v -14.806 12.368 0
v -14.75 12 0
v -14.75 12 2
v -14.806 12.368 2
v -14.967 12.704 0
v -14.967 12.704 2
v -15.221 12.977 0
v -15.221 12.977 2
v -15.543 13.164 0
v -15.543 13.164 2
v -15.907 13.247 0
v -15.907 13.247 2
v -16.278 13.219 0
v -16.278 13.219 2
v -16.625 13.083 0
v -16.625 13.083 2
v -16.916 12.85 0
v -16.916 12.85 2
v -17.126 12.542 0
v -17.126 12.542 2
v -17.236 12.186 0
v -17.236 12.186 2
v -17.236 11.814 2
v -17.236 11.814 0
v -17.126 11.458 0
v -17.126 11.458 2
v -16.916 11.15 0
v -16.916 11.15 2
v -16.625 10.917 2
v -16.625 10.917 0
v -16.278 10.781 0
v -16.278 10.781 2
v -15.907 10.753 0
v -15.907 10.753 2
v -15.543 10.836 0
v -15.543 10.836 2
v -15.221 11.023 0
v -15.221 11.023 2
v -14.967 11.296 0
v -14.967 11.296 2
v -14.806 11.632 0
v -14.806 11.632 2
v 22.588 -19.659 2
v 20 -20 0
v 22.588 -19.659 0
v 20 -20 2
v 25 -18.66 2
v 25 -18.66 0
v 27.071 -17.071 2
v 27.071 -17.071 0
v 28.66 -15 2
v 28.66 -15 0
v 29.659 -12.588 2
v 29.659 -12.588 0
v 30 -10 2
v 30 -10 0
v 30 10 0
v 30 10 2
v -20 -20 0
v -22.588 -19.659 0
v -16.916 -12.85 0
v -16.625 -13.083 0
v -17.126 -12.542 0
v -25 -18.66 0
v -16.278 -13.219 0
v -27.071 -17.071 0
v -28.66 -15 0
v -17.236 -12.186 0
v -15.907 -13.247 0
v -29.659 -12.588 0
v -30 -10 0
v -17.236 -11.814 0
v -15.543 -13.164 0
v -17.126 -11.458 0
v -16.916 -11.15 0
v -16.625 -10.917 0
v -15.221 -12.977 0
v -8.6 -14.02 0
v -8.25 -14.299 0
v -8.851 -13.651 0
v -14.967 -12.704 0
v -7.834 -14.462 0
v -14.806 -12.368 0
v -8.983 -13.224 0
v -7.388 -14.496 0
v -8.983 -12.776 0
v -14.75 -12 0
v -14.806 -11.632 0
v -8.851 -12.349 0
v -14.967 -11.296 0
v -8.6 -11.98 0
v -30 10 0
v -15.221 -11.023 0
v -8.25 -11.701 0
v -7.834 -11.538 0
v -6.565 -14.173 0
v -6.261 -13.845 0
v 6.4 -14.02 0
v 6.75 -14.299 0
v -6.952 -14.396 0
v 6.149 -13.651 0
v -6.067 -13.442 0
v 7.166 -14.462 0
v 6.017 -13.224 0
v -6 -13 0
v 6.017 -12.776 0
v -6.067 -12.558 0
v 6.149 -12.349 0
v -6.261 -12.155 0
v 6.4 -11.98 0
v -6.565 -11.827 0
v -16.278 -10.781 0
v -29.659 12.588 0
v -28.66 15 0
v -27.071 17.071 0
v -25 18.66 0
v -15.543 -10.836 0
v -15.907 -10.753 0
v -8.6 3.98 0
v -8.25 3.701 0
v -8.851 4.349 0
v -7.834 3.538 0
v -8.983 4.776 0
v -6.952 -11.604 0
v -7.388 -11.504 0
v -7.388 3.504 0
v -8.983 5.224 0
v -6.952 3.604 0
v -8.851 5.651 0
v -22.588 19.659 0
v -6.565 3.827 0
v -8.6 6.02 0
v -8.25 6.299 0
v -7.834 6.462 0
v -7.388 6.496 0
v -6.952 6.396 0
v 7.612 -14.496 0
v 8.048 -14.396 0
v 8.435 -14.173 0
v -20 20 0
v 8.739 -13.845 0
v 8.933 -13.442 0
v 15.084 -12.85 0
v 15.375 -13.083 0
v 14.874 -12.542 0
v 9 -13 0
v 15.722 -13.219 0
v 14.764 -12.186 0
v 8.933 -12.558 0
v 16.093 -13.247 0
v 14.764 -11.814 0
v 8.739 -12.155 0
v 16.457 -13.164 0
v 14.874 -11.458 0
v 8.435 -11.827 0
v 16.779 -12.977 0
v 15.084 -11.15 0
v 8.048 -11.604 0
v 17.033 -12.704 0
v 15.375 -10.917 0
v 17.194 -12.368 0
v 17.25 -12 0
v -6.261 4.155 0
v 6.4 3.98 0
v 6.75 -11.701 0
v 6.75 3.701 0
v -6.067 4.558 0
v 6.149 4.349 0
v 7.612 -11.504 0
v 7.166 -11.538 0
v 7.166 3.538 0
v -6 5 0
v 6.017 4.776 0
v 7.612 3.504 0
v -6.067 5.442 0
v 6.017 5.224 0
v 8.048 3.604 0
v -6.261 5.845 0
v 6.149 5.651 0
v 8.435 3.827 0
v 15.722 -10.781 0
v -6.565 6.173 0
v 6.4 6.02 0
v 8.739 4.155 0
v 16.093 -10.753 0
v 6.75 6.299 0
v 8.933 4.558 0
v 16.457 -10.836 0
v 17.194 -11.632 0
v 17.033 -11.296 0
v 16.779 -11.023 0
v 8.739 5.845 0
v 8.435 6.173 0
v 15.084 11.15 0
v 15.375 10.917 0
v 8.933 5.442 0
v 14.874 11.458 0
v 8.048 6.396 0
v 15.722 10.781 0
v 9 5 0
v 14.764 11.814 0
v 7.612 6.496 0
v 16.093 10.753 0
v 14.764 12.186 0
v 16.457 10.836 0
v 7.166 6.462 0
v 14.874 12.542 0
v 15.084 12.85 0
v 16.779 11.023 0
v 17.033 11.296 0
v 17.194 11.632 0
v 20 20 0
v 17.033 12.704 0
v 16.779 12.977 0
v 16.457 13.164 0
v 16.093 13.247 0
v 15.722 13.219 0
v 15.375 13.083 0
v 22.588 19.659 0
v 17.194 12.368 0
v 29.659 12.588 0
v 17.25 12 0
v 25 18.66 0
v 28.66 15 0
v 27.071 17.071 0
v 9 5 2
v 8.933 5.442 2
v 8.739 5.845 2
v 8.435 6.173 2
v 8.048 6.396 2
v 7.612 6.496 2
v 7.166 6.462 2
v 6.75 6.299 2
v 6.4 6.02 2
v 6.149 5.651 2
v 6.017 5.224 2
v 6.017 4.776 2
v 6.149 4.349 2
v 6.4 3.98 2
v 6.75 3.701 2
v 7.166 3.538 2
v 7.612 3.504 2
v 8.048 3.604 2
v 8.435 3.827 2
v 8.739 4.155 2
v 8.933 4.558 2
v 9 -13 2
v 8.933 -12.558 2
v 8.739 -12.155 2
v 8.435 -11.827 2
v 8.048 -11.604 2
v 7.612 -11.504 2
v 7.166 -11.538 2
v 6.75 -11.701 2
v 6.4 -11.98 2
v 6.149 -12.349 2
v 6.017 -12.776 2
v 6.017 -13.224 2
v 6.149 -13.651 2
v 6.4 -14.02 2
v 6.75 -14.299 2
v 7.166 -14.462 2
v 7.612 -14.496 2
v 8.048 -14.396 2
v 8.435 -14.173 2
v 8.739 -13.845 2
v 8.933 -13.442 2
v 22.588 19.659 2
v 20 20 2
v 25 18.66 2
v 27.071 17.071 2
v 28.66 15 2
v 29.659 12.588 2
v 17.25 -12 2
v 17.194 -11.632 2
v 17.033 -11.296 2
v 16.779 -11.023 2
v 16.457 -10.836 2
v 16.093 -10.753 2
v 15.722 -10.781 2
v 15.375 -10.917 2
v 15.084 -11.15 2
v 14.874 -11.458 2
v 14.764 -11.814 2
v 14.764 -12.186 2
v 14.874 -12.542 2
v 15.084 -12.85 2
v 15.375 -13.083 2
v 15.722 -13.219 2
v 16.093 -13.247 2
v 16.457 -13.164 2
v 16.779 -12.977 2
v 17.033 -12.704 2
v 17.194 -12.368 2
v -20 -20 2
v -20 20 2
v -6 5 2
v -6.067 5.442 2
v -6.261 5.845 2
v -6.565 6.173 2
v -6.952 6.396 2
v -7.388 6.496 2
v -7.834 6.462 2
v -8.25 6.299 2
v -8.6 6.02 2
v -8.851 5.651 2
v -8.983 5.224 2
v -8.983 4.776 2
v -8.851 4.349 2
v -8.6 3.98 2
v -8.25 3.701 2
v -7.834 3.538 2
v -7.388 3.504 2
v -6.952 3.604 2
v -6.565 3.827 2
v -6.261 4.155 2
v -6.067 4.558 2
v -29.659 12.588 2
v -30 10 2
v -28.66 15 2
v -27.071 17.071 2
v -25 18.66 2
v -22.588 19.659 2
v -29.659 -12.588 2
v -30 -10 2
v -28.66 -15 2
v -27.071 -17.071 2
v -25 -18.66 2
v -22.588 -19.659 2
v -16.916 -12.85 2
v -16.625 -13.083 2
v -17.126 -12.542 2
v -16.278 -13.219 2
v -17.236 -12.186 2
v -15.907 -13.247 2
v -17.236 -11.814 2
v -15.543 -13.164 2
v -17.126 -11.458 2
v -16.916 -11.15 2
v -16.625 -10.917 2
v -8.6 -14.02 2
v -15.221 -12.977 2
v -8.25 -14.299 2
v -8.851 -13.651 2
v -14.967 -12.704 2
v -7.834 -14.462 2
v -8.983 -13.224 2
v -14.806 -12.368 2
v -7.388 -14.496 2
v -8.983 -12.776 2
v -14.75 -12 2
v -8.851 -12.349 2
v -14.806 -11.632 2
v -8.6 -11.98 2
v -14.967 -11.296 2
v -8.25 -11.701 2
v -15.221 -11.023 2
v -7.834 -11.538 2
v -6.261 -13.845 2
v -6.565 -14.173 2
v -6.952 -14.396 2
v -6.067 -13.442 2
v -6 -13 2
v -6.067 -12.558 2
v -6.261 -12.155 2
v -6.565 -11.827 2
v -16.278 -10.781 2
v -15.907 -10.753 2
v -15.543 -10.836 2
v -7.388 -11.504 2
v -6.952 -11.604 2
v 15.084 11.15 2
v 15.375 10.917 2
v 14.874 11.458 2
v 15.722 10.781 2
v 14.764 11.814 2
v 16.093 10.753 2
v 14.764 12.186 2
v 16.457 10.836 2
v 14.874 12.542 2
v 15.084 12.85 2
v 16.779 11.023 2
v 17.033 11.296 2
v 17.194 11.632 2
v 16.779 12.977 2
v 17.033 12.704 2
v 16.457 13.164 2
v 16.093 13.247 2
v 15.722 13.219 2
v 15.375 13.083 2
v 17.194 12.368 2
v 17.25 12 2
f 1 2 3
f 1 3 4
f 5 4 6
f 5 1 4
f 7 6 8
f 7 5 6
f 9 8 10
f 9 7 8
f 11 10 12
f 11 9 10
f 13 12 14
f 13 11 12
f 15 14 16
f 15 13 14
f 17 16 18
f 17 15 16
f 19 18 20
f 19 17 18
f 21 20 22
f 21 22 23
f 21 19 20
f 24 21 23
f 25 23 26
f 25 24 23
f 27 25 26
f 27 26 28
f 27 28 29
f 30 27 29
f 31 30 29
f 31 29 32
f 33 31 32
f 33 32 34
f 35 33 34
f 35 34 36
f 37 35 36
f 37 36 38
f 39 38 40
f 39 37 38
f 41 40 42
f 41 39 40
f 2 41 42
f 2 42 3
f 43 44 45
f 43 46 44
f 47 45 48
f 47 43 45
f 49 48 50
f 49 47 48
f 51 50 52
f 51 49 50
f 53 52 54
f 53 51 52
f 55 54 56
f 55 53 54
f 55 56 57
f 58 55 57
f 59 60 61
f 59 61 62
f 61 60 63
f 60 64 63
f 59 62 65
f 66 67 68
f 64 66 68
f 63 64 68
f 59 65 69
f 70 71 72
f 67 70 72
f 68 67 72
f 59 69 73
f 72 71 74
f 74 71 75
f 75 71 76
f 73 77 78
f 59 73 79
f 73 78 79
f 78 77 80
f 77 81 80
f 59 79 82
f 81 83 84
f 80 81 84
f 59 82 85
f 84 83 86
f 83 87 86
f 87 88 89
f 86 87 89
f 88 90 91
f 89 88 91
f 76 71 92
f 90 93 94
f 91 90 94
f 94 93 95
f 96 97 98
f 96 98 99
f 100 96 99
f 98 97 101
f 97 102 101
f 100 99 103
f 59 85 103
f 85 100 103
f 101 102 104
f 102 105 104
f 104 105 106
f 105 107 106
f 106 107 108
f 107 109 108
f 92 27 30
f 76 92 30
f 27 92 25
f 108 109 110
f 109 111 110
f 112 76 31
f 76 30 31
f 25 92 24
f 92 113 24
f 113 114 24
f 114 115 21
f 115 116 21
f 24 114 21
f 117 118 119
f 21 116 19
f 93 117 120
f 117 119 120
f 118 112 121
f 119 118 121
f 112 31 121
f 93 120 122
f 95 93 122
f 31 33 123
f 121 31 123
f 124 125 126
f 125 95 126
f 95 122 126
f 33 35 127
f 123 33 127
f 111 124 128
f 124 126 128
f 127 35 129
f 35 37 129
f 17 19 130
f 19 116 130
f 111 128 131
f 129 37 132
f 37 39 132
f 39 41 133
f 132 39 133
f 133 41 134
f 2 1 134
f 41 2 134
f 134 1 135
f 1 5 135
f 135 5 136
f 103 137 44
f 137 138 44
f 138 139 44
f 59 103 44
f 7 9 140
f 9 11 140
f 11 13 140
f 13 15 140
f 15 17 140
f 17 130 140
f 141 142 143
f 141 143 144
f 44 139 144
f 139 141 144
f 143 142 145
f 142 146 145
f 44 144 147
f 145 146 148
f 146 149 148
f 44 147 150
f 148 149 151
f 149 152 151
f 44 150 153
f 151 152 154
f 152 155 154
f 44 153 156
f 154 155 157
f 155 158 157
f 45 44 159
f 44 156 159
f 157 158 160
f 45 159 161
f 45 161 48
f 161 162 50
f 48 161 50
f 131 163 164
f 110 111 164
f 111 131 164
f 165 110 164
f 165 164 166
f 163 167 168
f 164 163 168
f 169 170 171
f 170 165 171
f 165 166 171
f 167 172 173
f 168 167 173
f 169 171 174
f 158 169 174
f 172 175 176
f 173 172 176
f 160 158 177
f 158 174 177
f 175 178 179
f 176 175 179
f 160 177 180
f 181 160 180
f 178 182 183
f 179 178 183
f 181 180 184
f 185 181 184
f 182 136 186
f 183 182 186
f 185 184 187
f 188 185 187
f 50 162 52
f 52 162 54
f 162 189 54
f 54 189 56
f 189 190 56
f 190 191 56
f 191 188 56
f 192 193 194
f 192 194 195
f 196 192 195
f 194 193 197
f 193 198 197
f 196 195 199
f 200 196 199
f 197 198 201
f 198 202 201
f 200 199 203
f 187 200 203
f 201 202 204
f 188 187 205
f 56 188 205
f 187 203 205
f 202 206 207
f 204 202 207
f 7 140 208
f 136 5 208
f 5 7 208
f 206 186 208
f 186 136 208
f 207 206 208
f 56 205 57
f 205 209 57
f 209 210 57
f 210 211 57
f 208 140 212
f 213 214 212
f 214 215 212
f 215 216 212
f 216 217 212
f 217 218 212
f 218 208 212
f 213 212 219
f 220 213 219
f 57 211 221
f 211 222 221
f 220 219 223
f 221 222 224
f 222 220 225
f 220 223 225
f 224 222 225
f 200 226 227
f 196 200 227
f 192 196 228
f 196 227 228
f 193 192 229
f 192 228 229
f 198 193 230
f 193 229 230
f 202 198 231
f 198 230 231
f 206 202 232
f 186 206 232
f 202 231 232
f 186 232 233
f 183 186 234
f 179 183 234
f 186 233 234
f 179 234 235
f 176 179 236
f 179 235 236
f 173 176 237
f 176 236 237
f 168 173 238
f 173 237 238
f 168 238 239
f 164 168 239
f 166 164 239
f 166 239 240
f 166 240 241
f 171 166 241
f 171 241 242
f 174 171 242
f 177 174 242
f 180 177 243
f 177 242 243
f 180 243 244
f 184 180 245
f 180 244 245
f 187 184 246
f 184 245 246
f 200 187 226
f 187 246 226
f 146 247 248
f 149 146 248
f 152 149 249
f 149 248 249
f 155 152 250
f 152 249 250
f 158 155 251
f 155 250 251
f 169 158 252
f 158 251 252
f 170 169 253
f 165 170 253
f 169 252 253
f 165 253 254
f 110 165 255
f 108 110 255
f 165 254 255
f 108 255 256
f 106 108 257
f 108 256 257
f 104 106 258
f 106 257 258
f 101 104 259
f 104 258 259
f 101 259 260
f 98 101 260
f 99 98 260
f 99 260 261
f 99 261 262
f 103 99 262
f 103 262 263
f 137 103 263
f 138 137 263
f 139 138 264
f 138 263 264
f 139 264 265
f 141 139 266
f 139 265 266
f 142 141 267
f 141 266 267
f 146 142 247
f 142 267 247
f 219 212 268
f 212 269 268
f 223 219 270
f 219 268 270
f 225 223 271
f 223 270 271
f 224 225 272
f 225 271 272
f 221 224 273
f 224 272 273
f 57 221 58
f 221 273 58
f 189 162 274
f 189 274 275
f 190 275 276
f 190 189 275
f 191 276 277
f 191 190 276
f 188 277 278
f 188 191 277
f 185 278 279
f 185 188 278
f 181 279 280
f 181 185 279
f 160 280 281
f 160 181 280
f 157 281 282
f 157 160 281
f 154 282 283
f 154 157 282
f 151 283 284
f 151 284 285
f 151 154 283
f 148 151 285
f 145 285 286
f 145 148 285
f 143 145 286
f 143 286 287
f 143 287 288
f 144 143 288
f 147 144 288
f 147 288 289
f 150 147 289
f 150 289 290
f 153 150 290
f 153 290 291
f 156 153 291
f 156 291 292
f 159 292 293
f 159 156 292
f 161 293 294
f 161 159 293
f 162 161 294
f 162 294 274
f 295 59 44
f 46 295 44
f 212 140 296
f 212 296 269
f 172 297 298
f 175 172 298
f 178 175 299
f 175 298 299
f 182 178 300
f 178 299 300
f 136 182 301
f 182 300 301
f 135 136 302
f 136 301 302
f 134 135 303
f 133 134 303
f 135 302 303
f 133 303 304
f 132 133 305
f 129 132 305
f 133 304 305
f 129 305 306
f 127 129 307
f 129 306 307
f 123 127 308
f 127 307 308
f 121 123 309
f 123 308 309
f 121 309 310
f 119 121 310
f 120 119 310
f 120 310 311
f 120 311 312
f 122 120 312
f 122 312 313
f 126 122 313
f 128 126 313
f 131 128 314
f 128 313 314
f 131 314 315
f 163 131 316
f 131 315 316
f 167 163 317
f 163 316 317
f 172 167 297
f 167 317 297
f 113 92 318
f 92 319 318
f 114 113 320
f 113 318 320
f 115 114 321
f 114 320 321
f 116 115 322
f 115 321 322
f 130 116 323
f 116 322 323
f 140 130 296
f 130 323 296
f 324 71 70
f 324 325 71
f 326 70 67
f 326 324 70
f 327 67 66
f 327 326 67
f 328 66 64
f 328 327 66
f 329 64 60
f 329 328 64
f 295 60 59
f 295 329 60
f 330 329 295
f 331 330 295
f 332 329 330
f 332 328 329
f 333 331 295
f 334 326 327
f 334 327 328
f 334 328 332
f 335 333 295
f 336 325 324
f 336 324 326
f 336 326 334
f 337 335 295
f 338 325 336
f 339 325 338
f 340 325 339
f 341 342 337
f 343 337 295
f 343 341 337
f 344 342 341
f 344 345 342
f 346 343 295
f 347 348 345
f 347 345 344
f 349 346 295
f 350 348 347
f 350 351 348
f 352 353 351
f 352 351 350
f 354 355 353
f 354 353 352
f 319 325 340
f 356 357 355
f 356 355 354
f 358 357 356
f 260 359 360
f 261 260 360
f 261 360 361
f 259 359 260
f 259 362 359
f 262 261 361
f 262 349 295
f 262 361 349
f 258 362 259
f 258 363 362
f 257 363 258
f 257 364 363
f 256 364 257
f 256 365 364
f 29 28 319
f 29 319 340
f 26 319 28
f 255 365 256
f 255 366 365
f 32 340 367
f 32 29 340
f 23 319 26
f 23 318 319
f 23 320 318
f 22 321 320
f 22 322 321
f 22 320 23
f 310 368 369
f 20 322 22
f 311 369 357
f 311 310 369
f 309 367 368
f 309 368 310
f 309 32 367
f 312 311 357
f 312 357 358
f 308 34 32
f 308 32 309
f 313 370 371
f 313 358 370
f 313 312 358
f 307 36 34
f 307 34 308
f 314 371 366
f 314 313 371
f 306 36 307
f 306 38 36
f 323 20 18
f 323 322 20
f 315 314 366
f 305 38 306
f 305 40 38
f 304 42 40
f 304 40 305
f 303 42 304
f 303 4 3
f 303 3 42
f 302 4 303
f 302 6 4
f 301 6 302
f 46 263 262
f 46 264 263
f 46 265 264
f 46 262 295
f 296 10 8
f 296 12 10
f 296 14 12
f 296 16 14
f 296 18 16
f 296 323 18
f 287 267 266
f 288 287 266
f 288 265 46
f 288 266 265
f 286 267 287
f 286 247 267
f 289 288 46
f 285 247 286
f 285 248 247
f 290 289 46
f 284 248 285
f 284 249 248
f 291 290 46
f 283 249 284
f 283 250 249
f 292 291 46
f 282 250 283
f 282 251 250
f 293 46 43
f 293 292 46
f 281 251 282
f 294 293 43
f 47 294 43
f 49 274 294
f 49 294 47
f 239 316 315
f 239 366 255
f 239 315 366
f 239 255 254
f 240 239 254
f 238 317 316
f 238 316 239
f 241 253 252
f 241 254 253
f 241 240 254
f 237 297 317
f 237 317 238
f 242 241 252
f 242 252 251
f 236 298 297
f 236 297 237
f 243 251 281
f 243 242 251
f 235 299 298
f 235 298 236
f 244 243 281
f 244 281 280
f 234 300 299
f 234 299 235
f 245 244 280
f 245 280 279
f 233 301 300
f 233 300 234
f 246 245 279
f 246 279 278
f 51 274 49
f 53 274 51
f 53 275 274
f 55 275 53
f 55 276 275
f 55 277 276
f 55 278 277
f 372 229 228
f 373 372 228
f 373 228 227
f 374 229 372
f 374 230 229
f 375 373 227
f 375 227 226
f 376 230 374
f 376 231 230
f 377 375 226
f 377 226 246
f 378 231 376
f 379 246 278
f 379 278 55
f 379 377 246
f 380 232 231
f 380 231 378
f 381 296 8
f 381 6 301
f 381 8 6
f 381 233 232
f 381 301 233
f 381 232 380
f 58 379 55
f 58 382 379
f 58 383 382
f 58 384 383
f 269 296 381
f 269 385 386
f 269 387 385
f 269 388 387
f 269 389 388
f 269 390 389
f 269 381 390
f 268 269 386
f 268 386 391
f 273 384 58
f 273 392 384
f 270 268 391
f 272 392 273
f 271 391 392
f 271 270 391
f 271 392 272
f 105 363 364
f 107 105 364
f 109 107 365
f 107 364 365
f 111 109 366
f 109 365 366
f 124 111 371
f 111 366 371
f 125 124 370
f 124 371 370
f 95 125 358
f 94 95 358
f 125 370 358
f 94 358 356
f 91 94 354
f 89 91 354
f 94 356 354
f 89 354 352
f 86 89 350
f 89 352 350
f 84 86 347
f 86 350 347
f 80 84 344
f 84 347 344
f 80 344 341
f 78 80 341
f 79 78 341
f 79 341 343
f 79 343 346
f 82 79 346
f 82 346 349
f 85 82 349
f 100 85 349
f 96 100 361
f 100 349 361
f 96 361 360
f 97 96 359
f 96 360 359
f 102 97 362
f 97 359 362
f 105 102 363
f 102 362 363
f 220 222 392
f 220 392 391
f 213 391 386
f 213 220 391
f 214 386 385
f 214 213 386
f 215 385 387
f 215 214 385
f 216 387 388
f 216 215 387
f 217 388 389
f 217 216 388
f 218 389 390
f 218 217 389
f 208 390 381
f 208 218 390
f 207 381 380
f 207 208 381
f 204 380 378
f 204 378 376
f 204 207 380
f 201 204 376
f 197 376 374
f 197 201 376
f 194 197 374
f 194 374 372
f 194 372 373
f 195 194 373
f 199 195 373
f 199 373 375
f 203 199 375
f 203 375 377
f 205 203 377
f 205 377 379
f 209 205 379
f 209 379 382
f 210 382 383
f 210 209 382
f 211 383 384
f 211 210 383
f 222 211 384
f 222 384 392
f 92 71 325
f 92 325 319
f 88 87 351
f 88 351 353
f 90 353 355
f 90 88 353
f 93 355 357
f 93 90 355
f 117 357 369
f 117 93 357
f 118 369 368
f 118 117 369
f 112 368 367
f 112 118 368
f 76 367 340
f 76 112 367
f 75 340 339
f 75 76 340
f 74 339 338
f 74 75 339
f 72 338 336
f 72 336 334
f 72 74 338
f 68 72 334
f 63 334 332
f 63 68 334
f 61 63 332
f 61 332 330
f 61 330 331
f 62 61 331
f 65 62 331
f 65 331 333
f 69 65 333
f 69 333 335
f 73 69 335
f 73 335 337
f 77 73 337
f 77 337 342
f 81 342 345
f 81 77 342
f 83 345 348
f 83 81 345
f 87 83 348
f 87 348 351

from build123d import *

# Parameters (mm, degrees)
SKETCH_1_W          = 60
SKETCH_1_H          = 40
SKETCH_1_R          = 1.25
EXTRUDE_1_DEPTH     = 2
FILLET_1_R          = 10
SKETCH_2_R          = 1.5
CUT_EXTRUDE_1_DEPTH = 2


with BuildPart() as part:
    # 草图1 → 凸台-拉伸1 (new body)
    with BuildSketch(Plane.XY):
        Rectangle(SKETCH_1_W, SKETCH_1_H)
        with Locations((-16, 12)):
            Circle(SKETCH_1_R, mode=Mode.SUBTRACT)
        with Locations((16, 12)):
            Circle(SKETCH_1_R, mode=Mode.SUBTRACT)
        with Locations((16, -12)):
            Circle(SKETCH_1_R, mode=Mode.SUBTRACT)
        with Locations((-16, -12)):
            Circle(SKETCH_1_R, mode=Mode.SUBTRACT)
    extrude(amount=EXTRUDE_1_DEPTH)

    # 圆角1
    fillet_1_edges = [part.edges().sort_by_distance(p)[0] for p in [
        (30, -20, 1),
        (-30, -20, 1),
        (-30, 20, 1),
        (30, 20, 1),
    ]]
    fillet(fillet_1_edges, radius=FILLET_1_R)

    # 草图2 → 切除-拉伸1 (cut)
    with BuildSketch(Plane.XY.offset(2)):
        with Locations((-7.5, 5)):
            Circle(SKETCH_2_R)
        with Locations((7.5, 5)):
            Circle(SKETCH_2_R)
        with Locations((7.5, -13)):
            Circle(SKETCH_2_R)
        with Locations((-7.5, -13)):
            Circle(SKETCH_2_R)
    extrude(amount=-CUT_EXTRUDE_1_DEPTH, mode=Mode.SUBTRACT)


solid = part.part
